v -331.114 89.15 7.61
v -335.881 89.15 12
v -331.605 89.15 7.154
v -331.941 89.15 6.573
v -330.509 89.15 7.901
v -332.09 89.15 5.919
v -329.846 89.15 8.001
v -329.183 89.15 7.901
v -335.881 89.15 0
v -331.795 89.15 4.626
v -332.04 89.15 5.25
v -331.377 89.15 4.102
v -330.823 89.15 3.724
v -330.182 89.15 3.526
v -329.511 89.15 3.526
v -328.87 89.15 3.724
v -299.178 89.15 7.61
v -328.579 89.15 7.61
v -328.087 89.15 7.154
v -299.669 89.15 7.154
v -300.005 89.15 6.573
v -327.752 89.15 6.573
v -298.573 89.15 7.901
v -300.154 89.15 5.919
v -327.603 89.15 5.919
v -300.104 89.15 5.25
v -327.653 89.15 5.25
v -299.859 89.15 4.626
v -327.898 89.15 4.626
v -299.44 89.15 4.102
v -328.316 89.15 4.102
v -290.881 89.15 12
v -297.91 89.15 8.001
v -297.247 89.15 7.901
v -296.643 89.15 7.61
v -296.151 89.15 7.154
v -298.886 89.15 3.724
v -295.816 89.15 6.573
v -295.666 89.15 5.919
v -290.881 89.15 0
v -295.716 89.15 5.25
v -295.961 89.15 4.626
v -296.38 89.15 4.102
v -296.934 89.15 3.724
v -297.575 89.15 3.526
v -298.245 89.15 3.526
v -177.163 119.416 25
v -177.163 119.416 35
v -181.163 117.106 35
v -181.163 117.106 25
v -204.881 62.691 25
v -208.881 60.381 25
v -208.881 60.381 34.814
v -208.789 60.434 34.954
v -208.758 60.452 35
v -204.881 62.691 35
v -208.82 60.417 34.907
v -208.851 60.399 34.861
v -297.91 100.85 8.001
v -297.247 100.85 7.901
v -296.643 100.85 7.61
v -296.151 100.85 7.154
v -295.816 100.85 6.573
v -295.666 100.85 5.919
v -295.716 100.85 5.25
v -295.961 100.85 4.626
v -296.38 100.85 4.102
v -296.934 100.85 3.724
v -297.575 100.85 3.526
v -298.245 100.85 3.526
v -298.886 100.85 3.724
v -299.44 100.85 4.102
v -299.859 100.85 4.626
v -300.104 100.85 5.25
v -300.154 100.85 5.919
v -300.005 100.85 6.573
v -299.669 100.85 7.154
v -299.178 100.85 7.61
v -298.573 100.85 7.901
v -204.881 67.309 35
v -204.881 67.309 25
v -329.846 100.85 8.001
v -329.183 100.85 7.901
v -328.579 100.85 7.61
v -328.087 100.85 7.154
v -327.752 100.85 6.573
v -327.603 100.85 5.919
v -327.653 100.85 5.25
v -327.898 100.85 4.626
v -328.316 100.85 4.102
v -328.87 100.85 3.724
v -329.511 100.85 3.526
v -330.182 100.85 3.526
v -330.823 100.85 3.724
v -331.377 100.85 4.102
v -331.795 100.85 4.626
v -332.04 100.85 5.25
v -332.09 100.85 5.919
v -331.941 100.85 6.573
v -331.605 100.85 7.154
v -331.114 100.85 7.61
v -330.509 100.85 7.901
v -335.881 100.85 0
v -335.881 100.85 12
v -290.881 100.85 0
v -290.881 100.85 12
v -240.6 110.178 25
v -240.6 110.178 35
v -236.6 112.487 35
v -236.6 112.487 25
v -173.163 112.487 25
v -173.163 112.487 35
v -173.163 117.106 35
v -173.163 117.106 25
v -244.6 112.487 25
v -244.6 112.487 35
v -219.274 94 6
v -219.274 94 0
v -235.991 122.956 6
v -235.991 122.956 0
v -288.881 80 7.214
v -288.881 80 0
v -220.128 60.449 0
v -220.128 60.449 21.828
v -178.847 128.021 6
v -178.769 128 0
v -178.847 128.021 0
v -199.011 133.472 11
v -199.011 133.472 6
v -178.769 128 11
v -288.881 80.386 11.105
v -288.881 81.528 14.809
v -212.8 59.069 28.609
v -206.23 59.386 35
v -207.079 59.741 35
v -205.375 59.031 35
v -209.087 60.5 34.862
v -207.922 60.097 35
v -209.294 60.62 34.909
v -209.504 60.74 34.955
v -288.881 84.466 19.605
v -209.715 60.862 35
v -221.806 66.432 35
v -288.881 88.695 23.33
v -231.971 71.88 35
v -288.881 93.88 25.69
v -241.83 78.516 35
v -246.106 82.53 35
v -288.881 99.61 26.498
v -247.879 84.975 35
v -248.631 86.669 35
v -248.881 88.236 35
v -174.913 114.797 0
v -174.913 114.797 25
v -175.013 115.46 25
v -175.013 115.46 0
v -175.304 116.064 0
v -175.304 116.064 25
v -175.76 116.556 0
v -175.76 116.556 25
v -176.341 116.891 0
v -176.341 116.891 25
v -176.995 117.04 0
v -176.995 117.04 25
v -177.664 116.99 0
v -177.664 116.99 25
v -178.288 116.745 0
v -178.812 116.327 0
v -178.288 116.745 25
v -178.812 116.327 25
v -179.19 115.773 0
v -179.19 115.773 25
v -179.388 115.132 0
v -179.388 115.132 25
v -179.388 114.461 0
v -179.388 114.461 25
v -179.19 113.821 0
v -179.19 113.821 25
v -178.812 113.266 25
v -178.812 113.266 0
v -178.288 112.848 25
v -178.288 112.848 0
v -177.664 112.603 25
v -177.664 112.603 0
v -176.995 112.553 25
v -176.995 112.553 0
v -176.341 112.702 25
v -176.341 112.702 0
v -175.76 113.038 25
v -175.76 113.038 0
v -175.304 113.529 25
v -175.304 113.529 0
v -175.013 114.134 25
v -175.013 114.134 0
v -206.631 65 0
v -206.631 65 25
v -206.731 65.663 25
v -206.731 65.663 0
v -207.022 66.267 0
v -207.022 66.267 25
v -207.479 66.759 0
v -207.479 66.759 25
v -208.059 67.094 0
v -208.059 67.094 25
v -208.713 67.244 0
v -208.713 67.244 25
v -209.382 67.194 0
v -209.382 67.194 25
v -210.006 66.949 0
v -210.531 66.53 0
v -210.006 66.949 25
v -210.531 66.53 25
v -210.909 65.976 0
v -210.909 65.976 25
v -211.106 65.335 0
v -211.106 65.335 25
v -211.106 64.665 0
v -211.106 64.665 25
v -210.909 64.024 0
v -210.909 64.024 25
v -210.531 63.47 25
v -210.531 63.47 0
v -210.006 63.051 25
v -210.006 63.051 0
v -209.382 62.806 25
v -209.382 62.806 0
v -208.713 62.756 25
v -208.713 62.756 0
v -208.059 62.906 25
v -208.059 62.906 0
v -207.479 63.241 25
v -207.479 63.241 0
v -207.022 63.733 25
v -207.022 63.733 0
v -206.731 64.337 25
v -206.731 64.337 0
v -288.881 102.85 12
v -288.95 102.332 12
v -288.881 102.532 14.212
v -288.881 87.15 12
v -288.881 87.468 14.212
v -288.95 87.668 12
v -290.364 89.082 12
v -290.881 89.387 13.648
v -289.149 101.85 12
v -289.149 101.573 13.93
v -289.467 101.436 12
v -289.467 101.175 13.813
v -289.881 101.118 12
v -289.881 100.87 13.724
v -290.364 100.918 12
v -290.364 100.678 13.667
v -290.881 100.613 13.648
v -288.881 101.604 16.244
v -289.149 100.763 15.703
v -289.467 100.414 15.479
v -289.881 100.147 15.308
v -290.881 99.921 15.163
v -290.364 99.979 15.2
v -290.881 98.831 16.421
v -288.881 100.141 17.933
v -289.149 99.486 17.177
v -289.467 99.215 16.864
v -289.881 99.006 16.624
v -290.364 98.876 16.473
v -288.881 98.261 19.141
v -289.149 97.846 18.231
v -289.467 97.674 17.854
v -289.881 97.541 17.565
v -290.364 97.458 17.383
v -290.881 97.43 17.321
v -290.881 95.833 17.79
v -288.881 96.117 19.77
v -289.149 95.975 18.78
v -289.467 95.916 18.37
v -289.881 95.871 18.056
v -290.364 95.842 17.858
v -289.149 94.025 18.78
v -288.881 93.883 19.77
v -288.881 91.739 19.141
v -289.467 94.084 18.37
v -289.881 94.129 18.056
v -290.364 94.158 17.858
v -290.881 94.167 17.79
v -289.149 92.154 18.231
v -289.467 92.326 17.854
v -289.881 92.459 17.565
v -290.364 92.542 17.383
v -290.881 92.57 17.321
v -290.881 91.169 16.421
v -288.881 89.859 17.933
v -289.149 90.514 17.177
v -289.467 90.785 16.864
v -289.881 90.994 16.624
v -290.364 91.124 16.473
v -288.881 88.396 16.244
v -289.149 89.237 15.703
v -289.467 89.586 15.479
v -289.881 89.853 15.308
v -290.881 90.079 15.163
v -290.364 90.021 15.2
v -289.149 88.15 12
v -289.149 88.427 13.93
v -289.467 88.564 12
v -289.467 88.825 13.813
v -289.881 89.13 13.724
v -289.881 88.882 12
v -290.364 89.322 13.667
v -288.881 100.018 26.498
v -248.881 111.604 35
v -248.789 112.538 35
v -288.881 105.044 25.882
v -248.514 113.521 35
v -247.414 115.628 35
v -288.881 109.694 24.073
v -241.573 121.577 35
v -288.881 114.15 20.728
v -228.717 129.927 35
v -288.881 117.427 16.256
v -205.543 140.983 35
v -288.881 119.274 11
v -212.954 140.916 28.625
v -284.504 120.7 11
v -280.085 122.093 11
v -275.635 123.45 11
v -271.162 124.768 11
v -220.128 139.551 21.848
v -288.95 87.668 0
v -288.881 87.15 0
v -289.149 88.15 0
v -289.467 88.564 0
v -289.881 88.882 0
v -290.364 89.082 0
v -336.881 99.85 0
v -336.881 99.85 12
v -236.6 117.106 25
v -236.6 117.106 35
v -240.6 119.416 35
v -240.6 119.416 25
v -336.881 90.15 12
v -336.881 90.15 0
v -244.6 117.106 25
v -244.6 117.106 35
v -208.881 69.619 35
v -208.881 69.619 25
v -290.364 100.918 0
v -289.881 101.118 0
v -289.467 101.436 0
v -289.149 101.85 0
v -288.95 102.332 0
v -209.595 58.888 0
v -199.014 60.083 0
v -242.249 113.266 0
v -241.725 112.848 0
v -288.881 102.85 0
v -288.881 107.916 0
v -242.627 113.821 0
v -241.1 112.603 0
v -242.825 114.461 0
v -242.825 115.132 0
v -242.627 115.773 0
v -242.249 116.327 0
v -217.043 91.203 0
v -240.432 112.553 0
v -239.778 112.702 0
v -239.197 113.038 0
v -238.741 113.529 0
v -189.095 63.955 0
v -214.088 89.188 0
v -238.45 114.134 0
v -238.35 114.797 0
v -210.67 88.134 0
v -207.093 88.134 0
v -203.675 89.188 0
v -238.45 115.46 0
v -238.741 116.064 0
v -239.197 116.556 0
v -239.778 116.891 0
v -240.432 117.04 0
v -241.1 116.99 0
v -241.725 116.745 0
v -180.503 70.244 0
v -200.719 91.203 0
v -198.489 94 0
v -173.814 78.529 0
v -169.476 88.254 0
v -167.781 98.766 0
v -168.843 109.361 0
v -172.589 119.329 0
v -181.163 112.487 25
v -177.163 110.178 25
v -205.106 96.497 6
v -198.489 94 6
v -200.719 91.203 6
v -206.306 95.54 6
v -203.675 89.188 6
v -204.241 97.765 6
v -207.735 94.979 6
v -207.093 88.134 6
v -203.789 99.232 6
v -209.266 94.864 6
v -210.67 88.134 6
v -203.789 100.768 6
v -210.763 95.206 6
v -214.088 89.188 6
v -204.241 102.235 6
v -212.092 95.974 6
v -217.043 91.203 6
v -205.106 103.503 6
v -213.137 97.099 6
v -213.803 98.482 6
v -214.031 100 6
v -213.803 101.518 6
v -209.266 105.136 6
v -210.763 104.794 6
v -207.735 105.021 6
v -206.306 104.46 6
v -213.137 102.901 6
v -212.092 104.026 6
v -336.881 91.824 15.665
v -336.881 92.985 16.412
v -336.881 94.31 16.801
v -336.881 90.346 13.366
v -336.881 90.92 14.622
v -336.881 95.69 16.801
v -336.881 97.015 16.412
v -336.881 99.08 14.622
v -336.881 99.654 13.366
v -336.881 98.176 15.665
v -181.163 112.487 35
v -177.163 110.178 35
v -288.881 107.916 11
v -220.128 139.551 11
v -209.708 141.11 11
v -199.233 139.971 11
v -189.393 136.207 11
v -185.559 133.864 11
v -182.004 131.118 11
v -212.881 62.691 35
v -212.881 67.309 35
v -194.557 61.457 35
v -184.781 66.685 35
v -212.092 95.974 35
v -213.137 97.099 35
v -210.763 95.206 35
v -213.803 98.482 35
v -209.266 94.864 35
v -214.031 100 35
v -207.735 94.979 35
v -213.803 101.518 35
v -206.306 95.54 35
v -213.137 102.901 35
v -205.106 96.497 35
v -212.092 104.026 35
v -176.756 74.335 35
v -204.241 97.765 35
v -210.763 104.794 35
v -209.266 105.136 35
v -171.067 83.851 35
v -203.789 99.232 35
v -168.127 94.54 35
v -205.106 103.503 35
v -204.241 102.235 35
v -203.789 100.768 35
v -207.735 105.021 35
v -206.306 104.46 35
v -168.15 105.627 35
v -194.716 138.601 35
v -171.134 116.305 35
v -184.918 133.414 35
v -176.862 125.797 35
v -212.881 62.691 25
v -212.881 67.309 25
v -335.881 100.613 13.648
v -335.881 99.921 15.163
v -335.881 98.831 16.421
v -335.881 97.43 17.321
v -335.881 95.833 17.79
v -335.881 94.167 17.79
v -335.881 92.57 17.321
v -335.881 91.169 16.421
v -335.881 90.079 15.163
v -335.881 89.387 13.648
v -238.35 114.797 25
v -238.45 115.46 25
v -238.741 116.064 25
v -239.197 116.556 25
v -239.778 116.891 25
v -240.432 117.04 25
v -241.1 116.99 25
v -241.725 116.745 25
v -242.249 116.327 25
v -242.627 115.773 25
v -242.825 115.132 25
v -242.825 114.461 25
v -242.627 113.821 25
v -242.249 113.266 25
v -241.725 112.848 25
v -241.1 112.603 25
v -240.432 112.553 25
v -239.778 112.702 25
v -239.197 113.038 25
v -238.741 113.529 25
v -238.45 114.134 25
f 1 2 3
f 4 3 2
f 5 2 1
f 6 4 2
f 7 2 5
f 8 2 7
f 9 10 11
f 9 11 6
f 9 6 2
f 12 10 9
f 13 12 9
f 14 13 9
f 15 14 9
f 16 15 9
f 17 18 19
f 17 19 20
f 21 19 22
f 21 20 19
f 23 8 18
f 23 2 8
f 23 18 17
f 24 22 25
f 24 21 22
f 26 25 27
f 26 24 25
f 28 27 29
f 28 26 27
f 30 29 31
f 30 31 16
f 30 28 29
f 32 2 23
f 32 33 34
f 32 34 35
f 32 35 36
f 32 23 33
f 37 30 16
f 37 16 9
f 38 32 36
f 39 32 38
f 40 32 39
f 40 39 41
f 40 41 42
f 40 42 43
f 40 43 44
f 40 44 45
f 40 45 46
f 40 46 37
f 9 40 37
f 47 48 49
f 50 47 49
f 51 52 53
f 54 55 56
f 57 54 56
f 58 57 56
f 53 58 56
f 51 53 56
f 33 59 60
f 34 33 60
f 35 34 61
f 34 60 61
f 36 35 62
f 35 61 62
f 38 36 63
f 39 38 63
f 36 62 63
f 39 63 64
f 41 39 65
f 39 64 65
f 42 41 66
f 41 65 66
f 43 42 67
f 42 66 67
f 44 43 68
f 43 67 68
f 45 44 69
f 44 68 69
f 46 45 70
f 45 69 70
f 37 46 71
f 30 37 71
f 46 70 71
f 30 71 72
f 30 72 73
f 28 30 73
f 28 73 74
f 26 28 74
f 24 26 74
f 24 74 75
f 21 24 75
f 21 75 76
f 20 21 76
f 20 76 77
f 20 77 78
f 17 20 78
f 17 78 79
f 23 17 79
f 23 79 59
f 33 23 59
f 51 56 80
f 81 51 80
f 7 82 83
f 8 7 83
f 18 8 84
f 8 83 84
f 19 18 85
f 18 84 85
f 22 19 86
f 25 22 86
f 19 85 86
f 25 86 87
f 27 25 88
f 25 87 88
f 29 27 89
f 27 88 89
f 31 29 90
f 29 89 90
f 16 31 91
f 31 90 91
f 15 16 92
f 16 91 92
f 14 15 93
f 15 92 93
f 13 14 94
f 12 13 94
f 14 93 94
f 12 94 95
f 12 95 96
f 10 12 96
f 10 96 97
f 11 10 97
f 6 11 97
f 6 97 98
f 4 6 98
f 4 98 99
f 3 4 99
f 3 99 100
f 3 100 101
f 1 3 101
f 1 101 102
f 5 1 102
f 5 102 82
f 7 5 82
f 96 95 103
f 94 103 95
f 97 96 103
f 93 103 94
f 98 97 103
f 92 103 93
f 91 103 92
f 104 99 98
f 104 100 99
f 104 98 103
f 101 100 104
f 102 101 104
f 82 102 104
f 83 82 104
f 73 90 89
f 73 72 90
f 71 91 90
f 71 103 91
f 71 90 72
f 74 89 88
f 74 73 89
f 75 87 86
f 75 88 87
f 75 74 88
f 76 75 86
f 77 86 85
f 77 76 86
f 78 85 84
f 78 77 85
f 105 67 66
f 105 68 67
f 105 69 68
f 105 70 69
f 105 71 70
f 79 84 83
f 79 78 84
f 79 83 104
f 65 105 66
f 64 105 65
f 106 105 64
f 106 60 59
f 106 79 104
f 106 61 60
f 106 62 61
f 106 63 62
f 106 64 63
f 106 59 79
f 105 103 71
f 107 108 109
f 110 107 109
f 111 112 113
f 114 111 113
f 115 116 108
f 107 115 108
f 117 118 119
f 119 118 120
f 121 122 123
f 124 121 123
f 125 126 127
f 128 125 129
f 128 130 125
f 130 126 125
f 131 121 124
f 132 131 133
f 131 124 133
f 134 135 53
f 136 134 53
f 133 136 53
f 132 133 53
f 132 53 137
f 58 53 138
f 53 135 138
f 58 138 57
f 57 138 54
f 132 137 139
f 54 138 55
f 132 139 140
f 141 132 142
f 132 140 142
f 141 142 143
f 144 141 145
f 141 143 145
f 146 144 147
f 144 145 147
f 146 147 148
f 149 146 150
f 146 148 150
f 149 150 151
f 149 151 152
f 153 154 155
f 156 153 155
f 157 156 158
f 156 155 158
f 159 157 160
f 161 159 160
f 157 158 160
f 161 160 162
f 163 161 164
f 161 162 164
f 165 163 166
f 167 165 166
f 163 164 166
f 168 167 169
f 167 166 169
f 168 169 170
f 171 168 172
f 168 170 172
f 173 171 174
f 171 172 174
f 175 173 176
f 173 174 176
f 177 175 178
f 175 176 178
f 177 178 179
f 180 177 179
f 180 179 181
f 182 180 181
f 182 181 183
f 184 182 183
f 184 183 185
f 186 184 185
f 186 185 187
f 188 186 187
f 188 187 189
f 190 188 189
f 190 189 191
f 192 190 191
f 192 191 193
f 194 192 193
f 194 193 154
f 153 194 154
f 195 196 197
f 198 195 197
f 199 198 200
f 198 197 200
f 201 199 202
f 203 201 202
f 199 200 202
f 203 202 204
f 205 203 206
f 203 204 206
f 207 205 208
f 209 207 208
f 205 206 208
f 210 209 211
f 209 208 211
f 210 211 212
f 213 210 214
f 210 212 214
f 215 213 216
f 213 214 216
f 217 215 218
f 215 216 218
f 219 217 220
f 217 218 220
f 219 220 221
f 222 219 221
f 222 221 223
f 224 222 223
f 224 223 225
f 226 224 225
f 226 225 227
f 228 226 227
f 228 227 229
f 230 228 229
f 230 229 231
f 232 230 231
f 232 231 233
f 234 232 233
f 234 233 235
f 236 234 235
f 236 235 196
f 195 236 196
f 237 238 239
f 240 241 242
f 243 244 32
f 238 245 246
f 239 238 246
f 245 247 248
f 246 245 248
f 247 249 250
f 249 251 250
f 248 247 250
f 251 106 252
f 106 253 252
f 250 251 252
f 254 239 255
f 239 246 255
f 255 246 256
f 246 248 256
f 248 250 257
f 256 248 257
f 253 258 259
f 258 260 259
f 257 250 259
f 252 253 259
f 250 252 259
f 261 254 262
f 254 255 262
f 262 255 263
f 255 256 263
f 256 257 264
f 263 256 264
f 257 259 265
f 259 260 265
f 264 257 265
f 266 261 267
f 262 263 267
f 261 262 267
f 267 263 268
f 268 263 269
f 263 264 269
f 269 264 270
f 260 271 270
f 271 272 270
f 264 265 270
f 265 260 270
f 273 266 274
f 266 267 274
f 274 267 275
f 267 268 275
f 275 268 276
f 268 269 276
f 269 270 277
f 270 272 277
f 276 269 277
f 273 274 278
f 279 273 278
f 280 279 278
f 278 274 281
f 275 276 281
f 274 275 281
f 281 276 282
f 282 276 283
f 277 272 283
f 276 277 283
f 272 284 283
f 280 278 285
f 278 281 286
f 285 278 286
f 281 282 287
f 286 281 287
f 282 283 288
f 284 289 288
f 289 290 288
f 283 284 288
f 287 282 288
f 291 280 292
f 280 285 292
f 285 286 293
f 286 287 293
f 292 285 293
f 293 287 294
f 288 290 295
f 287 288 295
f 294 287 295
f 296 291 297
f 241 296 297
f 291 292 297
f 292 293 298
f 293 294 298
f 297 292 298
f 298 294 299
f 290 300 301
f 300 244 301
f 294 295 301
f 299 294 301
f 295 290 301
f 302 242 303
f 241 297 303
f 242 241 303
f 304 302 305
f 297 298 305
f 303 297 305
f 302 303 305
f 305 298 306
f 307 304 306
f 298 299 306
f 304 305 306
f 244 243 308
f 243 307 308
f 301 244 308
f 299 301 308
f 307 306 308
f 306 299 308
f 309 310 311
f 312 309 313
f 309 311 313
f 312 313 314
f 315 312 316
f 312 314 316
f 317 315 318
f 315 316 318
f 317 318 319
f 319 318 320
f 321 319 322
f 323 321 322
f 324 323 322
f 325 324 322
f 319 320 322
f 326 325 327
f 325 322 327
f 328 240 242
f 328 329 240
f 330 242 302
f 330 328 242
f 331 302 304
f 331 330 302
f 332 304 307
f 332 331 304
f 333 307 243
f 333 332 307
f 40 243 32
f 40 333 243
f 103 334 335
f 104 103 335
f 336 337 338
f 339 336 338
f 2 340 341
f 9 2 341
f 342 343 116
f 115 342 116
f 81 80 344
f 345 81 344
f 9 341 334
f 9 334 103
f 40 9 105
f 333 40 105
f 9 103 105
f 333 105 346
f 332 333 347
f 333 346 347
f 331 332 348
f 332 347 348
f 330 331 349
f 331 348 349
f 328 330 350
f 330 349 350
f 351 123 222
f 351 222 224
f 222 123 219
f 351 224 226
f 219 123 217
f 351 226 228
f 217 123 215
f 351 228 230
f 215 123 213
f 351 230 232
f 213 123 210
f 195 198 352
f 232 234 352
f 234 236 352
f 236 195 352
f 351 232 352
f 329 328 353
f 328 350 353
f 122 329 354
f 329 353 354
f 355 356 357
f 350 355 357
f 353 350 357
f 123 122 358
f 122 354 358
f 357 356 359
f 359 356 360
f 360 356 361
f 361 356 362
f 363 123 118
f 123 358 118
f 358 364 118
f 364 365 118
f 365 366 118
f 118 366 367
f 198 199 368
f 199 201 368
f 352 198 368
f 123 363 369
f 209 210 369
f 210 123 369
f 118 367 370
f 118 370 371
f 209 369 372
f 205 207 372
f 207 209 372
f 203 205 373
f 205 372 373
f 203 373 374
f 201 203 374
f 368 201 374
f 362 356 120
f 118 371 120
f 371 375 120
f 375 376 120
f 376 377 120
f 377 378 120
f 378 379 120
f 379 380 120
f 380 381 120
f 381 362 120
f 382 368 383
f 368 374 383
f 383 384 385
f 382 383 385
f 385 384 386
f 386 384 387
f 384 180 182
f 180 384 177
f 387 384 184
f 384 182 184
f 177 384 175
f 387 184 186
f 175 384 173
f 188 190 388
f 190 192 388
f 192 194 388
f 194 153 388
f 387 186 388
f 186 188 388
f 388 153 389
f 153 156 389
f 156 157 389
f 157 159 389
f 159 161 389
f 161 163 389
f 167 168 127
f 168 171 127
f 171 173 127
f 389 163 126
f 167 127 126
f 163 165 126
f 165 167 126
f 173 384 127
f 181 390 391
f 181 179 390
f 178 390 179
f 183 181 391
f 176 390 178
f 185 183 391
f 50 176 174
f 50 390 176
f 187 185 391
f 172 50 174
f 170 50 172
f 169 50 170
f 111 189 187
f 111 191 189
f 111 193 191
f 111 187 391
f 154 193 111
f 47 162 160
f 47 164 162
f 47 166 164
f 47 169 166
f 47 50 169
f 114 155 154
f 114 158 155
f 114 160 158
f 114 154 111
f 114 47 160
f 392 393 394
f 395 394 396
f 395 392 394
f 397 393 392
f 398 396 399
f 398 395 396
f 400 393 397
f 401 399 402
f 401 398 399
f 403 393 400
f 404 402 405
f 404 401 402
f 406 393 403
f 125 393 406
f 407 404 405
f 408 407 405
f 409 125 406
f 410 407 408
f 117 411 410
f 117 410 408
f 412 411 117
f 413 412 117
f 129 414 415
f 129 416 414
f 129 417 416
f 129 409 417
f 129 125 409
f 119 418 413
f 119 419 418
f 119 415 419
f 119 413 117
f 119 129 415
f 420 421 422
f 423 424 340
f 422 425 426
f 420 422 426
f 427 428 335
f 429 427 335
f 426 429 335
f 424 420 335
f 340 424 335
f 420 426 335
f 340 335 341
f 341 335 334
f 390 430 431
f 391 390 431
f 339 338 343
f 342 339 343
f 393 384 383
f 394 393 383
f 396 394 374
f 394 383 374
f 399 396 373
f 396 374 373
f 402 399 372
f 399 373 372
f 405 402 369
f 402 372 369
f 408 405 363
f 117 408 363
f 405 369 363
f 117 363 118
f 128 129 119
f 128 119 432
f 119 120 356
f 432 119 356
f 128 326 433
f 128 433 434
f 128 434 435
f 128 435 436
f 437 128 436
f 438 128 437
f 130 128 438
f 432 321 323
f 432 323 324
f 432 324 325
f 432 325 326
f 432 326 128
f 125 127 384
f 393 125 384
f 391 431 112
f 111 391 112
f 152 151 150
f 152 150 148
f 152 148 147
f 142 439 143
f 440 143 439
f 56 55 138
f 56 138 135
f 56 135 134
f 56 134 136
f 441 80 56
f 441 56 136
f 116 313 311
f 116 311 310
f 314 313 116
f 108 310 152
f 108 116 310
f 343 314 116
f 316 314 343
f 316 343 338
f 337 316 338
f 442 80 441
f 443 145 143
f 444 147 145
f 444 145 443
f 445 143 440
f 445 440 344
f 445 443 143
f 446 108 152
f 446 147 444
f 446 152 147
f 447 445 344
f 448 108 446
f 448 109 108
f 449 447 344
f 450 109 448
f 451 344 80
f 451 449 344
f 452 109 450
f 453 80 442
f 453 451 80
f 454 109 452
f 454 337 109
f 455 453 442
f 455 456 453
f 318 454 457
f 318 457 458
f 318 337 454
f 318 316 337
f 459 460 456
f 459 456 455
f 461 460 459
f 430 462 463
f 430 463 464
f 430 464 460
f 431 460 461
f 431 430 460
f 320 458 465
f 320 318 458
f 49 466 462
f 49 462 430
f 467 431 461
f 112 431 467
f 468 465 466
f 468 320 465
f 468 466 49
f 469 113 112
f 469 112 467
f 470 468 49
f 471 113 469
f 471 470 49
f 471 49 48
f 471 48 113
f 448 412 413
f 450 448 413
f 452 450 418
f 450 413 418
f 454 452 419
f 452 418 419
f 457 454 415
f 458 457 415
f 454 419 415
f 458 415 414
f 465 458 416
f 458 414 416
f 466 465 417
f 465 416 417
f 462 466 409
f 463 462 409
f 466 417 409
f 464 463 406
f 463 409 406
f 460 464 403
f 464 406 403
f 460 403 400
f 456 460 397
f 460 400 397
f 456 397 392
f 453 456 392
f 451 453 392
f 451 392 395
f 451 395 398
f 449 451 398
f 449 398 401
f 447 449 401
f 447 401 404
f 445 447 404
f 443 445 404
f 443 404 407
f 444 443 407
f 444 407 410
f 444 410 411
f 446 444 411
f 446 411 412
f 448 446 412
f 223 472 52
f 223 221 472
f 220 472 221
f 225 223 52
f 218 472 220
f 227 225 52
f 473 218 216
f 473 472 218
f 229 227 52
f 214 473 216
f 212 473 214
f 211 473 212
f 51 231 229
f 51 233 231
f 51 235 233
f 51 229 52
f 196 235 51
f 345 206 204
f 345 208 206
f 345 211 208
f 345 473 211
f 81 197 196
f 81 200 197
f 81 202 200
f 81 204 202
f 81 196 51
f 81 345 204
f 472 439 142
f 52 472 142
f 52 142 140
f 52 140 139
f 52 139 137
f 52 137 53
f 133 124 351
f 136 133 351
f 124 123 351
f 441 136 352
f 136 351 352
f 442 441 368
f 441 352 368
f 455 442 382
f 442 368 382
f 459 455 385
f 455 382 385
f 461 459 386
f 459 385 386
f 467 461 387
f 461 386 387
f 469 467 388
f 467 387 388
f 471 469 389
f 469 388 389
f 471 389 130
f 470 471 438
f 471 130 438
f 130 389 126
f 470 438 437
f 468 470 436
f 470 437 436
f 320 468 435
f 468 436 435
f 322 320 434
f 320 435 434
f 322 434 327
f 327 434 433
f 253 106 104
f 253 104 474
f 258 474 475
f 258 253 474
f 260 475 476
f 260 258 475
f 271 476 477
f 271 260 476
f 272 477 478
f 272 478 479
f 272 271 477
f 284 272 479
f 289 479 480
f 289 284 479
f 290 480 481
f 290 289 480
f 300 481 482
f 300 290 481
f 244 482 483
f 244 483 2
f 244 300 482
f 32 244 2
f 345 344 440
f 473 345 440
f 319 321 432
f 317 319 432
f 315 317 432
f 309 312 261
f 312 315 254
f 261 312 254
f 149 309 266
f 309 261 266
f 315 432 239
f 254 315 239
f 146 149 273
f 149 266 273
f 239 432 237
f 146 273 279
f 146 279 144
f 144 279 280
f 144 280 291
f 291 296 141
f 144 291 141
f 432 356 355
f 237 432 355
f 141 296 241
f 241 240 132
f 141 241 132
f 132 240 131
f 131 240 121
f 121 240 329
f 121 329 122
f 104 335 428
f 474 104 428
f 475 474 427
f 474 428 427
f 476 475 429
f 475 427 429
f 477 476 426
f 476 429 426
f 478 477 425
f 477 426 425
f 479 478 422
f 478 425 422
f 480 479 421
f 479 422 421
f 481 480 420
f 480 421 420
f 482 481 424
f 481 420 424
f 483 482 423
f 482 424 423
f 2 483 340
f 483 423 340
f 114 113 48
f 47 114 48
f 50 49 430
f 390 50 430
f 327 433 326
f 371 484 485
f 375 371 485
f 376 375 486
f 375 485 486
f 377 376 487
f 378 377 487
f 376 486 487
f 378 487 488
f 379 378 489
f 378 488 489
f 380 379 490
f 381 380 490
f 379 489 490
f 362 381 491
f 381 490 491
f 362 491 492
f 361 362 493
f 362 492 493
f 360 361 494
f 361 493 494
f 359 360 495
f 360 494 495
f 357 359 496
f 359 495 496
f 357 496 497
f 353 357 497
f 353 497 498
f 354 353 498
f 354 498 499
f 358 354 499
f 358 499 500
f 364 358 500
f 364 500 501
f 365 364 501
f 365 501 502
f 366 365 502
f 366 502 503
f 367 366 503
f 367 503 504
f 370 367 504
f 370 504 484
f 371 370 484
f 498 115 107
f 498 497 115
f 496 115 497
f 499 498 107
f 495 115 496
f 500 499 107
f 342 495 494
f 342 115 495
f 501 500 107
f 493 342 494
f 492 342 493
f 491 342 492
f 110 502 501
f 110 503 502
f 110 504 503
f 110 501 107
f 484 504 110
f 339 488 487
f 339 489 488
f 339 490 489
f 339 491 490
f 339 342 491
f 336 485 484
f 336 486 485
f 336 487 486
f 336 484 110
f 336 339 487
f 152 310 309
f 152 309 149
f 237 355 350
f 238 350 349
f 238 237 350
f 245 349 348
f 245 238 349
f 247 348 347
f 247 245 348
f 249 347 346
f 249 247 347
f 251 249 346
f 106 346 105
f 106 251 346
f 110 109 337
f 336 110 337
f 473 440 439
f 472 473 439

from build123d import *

# Parameters (mm, degrees)
RESSALTO_EXTRUS_O1_DEPTH = 35
CHANFRO1_SIZE            = 40
CHANFRO1_SIZE2           = 8.502262467
FILETE2_R                = 20
CORTE_EXTRUS_O2_DEPTH    = 6
CORTE_EXTRUS_O3_DEPTH    = 11
CHANFRO2_SIZE            = 10
RESSALTO_EXTRUS_O2_DEPTH = 48
CHANFRO3_SIZE            = 1
FILETE3_R                = 2
ESBO_O9_R                = 2.25
CORTE_EXTRUS_O4_DEPTH    = 342.284989024
ESBO_O10_R               = 5.15
CORTE_EXTRUS_O5_DEPTH    = 367.917618461
CORTE_EXTRUS_O7_DEPTH    = 10
ESBO_O13_R               = 2.25
CORTE_EXTRUS_O8_DEPTH    = 367.09908322


with BuildPart() as part:
    # Esboço1 → Ressalto-extrusão1 (new body)
    with BuildSketch(Plane.XY):
        with BuildLine():
            Line((-288.88140452, 80), (-220.127979697, 60.449355997))
            ThreePointArc((-220.127979697, 60.449355997), (-167.76280904, 100), (-220.127979697, 139.550644003))
            Line((-220.127979697, 139.550644003), (-288.88140452, 119.635273108))
            Line((-288.88140452, 119.635273108), (-288.88140452, 80))
        make_face()
    extrude(amount=RESSALTO_EXTRUS_O1_DEPTH)

    # Chanfro1
    chanfro1_edges = [part.edges().sort_by_distance(p)[0] for p in [
        (-288.88140452, 99.817636554, 35),
    ]]
    chanfro1_side = [part.faces().sort_by_distance(p)[0] for p in [
        (-225.798931966, 99.956743446, 35),
    ]]
    chamfer(chanfro1_edges, length=CHANFRO1_SIZE, length2=CHANFRO1_SIZE2, reference=chanfro1_side[0])

    # Filete2
    # the kernel refuses this fillet: 20 mm, written as the material it takes off along each edge
    with BuildSketch(Plane(origin=(-115.658970437, 169.81152296, 63.317302526), x_dir=(0.19213899287120792, 0.055655690116350805, -0.9797882687479528), z_dir=(-0.9411018224853822, -0.27260302876307696, -0.2000373675688854))) as filete2_piece_1:
        with BuildLine():
            CenterArc((FILETE2_R * 0.943733759019, FILETE2_R), FILETE2_R, 183.31621355, 86.68378645)
            Line((-FILETE2_R * 0.054591728164, FILETE2_R * 0.942153464743), (0, 0))
            Line((0, 0), (FILETE2_R * 0.943733759019, 0))
        make_face()
    extrude(amount=231.2501229, mode=Mode.SUBTRACT)
    with BuildSketch(Plane(origin=(-115.347800558, 30.654185994, 63.383443726), x_dir=(0.2621163849534368, 0.9634266390424966, 0.05571455754307817), z_dir=(-0.9423734554624519, 0.2679722209171675, -0.2003076615021976))) as filete2_piece_2:
        with BuildLine():
            CenterArc((FILETE2_R * 0.9446616108, FILETE2_R), FILETE2_R, 183.260002361, 86.739997639)
            Line((-FILETE2_R * 0.0537201474496, FILETE2_R * 0.943132919942), (0, 0))
            Line((0, 0), (FILETE2_R * 0.9446616108, 0))
        make_face()
    extrude(amount=231.378339467, mode=Mode.SUBTRACT)

    # Esboço6 → Corte-extrusão2 (cut)
    with BuildSketch(Plane(origin=(0, 0, 0), x_dir=(-1, 0, 0), z_dir=(0, 0, -1))):
        with BuildLine():
            Line((219.273709365, 94), (245.2234198, 138.946216915))
            Line((245.2234198, 138.946216915), (172.539389239, 138.946216915))
            Line((172.539389239, 138.946216915), (198.489099675, 94))
            ThreePointArc((198.489099675, 94), (208.88140452, 88), (219.273709365, 94))
        make_face()
    extrude(amount=-CORTE_EXTRUS_O2_DEPTH, mode=Mode.SUBTRACT)

    # Esboço7 → Corte-extrusão3 (cut)
    with BuildSketch(Plane(origin=(0, 0, 0), x_dir=(-1, 0, 0), z_dir=(0, 0, -1))):
        Polygon((179.171530951, 139.11313265), (295.618088129, 106.000524942), (295.618088129, 136.423544796), (188.948158446, 165.308096575), align=None)
    extrude(amount=-CORTE_EXTRUS_O3_DEPTH, mode=Mode.SUBTRACT)

    # Chanfro2
    # the kernel refuses this chamfer: 22.612495948, 10 mm, written as the material it takes off along each edge
    with BuildSketch(Plane(origin=(-189.392572811, 136.206689062, 11), x_dir=(0.7913619734687217, -0.6113478771924299, 0), z_dir=(0, 0, -1))) as chanfro2_piece_1:
        with BuildLine():
            Line((13.424324353, 0), (-CHANFRO2_SIZE * 0.593972278099, CHANFRO2_SIZE * 0.804485508167))
            Line((-CHANFRO2_SIZE * 0.593972278099, CHANFRO2_SIZE * 0.804485508167), (0, 0))
            ThreePointArc((0, 0), (7.133656498, -0.549382314), (13.424324353, 0))
        make_face()
    extrude(amount=40.659571502, mode=Mode.SUBTRACT)

    # Esboço8 → Ressalto-extrusão2 (add)
    with BuildSketch(Plane.ZY.offset(288.88140452)):
        with BuildLine():
            Line((0, 100.85), (12, 100.85))
            ThreePointArc((12, 100.85), (17.85, 95), (12, 89.15))
            Line((12, 89.15), (0, 89.15))
            Line((0, 89.15), (0, 100.85))
        make_face()
    extrude(amount=RESSALTO_EXTRUS_O2_DEPTH)

    # Chanfro3
    chanfro3_edges = [part.edges().sort_by_distance(p)[0] for p in [
        (-336.88140452, 89.15, 6),
        (-336.88140452, 95, 17.85),
        (-336.88140452, 100.85, 6),
    ]]
    chamfer(chanfro3_edges, length=CHANFRO3_SIZE)

    # Filete3
    filete3_edges = [part.edges().sort_by_distance(p)[0] for p in [
        (-288.88140452, 89.15, 6),
        (-288.88140452, 95, 17.85),
        (-288.88140452, 100.85, 6),
    ]]
    fillet(filete3_edges, radius=FILETE3_R)

    # Esboço9 → Corte-extrusão4 (cut, through all)
    with BuildSketch(Plane(origin=(0, 100.85, 0), x_dir=(1, 0, 0), z_dir=(0, 1, 0))):
        with Locations(Location((-329.846296891, -5.75110431, 0), (0, 0, 270))):
            Circle(ESBO_O9_R)
        with Locations(Location((-297.910035946, -5.75110431, 0), (0, 0, 270))):
            Circle(ESBO_O9_R)
    extrude(amount=-CORTE_EXTRUS_O4_DEPTH, mode=Mode.SUBTRACT)

    # Esboço10 → Corte-extrusão5 (cut, through all)
    with BuildSketch(Plane(origin=(0, 0, 0), x_dir=(-1, 0, 0), z_dir=(0, 0, -1))):
        with Locations((208.88140452, 100)):
            Circle(ESBO_O10_R)
    extrude(amount=-CORTE_EXTRUS_O5_DEPTH, mode=Mode.SUBTRACT)

    # Esboço12 → Corte-extrusão7 (cut)
    with BuildSketch(Plane.XY.offset(35)):
        Polygon((-240.599798192, 119.415541755), (-244.599798192, 117.106140678), (-244.599798192, 112.487338525), (-240.599798192, 110.177937448), (-236.599798192, 112.487338525), (-236.599798192, 117.106140678), align=None)
        Polygon((-208.88140452, 69.618802154), (-212.88140452, 67.309401077), (-212.88140452, 62.690598923), (-208.88140452, 60.381197846), (-204.88140452, 62.690598923), (-204.88140452, 67.309401077), align=None)
        Polygon((-177.163010847, 119.415541755), (-181.163010847, 117.106140678), (-181.163010847, 112.487338525), (-177.163010847, 110.177937448), (-173.163010847, 112.487338525), (-173.163010847, 117.106140678), align=None)
    extrude(amount=-CORTE_EXTRUS_O7_DEPTH, mode=Mode.SUBTRACT)

    # Esboço13 → Corte-extrusão8 (cut, through all)
    with BuildSketch(Plane.XY.offset(25)):
        with Locations((-177.163010847, 114.796739602)):
            Circle(ESBO_O13_R)
        with Locations((-208.88140452, 65)):
            Circle(ESBO_O13_R)
        with Locations((-240.599798192, 114.796739602)):
            Circle(ESBO_O13_R)
    extrude(amount=-CORTE_EXTRUS_O8_DEPTH, mode=Mode.SUBTRACT)


solid = part.part
